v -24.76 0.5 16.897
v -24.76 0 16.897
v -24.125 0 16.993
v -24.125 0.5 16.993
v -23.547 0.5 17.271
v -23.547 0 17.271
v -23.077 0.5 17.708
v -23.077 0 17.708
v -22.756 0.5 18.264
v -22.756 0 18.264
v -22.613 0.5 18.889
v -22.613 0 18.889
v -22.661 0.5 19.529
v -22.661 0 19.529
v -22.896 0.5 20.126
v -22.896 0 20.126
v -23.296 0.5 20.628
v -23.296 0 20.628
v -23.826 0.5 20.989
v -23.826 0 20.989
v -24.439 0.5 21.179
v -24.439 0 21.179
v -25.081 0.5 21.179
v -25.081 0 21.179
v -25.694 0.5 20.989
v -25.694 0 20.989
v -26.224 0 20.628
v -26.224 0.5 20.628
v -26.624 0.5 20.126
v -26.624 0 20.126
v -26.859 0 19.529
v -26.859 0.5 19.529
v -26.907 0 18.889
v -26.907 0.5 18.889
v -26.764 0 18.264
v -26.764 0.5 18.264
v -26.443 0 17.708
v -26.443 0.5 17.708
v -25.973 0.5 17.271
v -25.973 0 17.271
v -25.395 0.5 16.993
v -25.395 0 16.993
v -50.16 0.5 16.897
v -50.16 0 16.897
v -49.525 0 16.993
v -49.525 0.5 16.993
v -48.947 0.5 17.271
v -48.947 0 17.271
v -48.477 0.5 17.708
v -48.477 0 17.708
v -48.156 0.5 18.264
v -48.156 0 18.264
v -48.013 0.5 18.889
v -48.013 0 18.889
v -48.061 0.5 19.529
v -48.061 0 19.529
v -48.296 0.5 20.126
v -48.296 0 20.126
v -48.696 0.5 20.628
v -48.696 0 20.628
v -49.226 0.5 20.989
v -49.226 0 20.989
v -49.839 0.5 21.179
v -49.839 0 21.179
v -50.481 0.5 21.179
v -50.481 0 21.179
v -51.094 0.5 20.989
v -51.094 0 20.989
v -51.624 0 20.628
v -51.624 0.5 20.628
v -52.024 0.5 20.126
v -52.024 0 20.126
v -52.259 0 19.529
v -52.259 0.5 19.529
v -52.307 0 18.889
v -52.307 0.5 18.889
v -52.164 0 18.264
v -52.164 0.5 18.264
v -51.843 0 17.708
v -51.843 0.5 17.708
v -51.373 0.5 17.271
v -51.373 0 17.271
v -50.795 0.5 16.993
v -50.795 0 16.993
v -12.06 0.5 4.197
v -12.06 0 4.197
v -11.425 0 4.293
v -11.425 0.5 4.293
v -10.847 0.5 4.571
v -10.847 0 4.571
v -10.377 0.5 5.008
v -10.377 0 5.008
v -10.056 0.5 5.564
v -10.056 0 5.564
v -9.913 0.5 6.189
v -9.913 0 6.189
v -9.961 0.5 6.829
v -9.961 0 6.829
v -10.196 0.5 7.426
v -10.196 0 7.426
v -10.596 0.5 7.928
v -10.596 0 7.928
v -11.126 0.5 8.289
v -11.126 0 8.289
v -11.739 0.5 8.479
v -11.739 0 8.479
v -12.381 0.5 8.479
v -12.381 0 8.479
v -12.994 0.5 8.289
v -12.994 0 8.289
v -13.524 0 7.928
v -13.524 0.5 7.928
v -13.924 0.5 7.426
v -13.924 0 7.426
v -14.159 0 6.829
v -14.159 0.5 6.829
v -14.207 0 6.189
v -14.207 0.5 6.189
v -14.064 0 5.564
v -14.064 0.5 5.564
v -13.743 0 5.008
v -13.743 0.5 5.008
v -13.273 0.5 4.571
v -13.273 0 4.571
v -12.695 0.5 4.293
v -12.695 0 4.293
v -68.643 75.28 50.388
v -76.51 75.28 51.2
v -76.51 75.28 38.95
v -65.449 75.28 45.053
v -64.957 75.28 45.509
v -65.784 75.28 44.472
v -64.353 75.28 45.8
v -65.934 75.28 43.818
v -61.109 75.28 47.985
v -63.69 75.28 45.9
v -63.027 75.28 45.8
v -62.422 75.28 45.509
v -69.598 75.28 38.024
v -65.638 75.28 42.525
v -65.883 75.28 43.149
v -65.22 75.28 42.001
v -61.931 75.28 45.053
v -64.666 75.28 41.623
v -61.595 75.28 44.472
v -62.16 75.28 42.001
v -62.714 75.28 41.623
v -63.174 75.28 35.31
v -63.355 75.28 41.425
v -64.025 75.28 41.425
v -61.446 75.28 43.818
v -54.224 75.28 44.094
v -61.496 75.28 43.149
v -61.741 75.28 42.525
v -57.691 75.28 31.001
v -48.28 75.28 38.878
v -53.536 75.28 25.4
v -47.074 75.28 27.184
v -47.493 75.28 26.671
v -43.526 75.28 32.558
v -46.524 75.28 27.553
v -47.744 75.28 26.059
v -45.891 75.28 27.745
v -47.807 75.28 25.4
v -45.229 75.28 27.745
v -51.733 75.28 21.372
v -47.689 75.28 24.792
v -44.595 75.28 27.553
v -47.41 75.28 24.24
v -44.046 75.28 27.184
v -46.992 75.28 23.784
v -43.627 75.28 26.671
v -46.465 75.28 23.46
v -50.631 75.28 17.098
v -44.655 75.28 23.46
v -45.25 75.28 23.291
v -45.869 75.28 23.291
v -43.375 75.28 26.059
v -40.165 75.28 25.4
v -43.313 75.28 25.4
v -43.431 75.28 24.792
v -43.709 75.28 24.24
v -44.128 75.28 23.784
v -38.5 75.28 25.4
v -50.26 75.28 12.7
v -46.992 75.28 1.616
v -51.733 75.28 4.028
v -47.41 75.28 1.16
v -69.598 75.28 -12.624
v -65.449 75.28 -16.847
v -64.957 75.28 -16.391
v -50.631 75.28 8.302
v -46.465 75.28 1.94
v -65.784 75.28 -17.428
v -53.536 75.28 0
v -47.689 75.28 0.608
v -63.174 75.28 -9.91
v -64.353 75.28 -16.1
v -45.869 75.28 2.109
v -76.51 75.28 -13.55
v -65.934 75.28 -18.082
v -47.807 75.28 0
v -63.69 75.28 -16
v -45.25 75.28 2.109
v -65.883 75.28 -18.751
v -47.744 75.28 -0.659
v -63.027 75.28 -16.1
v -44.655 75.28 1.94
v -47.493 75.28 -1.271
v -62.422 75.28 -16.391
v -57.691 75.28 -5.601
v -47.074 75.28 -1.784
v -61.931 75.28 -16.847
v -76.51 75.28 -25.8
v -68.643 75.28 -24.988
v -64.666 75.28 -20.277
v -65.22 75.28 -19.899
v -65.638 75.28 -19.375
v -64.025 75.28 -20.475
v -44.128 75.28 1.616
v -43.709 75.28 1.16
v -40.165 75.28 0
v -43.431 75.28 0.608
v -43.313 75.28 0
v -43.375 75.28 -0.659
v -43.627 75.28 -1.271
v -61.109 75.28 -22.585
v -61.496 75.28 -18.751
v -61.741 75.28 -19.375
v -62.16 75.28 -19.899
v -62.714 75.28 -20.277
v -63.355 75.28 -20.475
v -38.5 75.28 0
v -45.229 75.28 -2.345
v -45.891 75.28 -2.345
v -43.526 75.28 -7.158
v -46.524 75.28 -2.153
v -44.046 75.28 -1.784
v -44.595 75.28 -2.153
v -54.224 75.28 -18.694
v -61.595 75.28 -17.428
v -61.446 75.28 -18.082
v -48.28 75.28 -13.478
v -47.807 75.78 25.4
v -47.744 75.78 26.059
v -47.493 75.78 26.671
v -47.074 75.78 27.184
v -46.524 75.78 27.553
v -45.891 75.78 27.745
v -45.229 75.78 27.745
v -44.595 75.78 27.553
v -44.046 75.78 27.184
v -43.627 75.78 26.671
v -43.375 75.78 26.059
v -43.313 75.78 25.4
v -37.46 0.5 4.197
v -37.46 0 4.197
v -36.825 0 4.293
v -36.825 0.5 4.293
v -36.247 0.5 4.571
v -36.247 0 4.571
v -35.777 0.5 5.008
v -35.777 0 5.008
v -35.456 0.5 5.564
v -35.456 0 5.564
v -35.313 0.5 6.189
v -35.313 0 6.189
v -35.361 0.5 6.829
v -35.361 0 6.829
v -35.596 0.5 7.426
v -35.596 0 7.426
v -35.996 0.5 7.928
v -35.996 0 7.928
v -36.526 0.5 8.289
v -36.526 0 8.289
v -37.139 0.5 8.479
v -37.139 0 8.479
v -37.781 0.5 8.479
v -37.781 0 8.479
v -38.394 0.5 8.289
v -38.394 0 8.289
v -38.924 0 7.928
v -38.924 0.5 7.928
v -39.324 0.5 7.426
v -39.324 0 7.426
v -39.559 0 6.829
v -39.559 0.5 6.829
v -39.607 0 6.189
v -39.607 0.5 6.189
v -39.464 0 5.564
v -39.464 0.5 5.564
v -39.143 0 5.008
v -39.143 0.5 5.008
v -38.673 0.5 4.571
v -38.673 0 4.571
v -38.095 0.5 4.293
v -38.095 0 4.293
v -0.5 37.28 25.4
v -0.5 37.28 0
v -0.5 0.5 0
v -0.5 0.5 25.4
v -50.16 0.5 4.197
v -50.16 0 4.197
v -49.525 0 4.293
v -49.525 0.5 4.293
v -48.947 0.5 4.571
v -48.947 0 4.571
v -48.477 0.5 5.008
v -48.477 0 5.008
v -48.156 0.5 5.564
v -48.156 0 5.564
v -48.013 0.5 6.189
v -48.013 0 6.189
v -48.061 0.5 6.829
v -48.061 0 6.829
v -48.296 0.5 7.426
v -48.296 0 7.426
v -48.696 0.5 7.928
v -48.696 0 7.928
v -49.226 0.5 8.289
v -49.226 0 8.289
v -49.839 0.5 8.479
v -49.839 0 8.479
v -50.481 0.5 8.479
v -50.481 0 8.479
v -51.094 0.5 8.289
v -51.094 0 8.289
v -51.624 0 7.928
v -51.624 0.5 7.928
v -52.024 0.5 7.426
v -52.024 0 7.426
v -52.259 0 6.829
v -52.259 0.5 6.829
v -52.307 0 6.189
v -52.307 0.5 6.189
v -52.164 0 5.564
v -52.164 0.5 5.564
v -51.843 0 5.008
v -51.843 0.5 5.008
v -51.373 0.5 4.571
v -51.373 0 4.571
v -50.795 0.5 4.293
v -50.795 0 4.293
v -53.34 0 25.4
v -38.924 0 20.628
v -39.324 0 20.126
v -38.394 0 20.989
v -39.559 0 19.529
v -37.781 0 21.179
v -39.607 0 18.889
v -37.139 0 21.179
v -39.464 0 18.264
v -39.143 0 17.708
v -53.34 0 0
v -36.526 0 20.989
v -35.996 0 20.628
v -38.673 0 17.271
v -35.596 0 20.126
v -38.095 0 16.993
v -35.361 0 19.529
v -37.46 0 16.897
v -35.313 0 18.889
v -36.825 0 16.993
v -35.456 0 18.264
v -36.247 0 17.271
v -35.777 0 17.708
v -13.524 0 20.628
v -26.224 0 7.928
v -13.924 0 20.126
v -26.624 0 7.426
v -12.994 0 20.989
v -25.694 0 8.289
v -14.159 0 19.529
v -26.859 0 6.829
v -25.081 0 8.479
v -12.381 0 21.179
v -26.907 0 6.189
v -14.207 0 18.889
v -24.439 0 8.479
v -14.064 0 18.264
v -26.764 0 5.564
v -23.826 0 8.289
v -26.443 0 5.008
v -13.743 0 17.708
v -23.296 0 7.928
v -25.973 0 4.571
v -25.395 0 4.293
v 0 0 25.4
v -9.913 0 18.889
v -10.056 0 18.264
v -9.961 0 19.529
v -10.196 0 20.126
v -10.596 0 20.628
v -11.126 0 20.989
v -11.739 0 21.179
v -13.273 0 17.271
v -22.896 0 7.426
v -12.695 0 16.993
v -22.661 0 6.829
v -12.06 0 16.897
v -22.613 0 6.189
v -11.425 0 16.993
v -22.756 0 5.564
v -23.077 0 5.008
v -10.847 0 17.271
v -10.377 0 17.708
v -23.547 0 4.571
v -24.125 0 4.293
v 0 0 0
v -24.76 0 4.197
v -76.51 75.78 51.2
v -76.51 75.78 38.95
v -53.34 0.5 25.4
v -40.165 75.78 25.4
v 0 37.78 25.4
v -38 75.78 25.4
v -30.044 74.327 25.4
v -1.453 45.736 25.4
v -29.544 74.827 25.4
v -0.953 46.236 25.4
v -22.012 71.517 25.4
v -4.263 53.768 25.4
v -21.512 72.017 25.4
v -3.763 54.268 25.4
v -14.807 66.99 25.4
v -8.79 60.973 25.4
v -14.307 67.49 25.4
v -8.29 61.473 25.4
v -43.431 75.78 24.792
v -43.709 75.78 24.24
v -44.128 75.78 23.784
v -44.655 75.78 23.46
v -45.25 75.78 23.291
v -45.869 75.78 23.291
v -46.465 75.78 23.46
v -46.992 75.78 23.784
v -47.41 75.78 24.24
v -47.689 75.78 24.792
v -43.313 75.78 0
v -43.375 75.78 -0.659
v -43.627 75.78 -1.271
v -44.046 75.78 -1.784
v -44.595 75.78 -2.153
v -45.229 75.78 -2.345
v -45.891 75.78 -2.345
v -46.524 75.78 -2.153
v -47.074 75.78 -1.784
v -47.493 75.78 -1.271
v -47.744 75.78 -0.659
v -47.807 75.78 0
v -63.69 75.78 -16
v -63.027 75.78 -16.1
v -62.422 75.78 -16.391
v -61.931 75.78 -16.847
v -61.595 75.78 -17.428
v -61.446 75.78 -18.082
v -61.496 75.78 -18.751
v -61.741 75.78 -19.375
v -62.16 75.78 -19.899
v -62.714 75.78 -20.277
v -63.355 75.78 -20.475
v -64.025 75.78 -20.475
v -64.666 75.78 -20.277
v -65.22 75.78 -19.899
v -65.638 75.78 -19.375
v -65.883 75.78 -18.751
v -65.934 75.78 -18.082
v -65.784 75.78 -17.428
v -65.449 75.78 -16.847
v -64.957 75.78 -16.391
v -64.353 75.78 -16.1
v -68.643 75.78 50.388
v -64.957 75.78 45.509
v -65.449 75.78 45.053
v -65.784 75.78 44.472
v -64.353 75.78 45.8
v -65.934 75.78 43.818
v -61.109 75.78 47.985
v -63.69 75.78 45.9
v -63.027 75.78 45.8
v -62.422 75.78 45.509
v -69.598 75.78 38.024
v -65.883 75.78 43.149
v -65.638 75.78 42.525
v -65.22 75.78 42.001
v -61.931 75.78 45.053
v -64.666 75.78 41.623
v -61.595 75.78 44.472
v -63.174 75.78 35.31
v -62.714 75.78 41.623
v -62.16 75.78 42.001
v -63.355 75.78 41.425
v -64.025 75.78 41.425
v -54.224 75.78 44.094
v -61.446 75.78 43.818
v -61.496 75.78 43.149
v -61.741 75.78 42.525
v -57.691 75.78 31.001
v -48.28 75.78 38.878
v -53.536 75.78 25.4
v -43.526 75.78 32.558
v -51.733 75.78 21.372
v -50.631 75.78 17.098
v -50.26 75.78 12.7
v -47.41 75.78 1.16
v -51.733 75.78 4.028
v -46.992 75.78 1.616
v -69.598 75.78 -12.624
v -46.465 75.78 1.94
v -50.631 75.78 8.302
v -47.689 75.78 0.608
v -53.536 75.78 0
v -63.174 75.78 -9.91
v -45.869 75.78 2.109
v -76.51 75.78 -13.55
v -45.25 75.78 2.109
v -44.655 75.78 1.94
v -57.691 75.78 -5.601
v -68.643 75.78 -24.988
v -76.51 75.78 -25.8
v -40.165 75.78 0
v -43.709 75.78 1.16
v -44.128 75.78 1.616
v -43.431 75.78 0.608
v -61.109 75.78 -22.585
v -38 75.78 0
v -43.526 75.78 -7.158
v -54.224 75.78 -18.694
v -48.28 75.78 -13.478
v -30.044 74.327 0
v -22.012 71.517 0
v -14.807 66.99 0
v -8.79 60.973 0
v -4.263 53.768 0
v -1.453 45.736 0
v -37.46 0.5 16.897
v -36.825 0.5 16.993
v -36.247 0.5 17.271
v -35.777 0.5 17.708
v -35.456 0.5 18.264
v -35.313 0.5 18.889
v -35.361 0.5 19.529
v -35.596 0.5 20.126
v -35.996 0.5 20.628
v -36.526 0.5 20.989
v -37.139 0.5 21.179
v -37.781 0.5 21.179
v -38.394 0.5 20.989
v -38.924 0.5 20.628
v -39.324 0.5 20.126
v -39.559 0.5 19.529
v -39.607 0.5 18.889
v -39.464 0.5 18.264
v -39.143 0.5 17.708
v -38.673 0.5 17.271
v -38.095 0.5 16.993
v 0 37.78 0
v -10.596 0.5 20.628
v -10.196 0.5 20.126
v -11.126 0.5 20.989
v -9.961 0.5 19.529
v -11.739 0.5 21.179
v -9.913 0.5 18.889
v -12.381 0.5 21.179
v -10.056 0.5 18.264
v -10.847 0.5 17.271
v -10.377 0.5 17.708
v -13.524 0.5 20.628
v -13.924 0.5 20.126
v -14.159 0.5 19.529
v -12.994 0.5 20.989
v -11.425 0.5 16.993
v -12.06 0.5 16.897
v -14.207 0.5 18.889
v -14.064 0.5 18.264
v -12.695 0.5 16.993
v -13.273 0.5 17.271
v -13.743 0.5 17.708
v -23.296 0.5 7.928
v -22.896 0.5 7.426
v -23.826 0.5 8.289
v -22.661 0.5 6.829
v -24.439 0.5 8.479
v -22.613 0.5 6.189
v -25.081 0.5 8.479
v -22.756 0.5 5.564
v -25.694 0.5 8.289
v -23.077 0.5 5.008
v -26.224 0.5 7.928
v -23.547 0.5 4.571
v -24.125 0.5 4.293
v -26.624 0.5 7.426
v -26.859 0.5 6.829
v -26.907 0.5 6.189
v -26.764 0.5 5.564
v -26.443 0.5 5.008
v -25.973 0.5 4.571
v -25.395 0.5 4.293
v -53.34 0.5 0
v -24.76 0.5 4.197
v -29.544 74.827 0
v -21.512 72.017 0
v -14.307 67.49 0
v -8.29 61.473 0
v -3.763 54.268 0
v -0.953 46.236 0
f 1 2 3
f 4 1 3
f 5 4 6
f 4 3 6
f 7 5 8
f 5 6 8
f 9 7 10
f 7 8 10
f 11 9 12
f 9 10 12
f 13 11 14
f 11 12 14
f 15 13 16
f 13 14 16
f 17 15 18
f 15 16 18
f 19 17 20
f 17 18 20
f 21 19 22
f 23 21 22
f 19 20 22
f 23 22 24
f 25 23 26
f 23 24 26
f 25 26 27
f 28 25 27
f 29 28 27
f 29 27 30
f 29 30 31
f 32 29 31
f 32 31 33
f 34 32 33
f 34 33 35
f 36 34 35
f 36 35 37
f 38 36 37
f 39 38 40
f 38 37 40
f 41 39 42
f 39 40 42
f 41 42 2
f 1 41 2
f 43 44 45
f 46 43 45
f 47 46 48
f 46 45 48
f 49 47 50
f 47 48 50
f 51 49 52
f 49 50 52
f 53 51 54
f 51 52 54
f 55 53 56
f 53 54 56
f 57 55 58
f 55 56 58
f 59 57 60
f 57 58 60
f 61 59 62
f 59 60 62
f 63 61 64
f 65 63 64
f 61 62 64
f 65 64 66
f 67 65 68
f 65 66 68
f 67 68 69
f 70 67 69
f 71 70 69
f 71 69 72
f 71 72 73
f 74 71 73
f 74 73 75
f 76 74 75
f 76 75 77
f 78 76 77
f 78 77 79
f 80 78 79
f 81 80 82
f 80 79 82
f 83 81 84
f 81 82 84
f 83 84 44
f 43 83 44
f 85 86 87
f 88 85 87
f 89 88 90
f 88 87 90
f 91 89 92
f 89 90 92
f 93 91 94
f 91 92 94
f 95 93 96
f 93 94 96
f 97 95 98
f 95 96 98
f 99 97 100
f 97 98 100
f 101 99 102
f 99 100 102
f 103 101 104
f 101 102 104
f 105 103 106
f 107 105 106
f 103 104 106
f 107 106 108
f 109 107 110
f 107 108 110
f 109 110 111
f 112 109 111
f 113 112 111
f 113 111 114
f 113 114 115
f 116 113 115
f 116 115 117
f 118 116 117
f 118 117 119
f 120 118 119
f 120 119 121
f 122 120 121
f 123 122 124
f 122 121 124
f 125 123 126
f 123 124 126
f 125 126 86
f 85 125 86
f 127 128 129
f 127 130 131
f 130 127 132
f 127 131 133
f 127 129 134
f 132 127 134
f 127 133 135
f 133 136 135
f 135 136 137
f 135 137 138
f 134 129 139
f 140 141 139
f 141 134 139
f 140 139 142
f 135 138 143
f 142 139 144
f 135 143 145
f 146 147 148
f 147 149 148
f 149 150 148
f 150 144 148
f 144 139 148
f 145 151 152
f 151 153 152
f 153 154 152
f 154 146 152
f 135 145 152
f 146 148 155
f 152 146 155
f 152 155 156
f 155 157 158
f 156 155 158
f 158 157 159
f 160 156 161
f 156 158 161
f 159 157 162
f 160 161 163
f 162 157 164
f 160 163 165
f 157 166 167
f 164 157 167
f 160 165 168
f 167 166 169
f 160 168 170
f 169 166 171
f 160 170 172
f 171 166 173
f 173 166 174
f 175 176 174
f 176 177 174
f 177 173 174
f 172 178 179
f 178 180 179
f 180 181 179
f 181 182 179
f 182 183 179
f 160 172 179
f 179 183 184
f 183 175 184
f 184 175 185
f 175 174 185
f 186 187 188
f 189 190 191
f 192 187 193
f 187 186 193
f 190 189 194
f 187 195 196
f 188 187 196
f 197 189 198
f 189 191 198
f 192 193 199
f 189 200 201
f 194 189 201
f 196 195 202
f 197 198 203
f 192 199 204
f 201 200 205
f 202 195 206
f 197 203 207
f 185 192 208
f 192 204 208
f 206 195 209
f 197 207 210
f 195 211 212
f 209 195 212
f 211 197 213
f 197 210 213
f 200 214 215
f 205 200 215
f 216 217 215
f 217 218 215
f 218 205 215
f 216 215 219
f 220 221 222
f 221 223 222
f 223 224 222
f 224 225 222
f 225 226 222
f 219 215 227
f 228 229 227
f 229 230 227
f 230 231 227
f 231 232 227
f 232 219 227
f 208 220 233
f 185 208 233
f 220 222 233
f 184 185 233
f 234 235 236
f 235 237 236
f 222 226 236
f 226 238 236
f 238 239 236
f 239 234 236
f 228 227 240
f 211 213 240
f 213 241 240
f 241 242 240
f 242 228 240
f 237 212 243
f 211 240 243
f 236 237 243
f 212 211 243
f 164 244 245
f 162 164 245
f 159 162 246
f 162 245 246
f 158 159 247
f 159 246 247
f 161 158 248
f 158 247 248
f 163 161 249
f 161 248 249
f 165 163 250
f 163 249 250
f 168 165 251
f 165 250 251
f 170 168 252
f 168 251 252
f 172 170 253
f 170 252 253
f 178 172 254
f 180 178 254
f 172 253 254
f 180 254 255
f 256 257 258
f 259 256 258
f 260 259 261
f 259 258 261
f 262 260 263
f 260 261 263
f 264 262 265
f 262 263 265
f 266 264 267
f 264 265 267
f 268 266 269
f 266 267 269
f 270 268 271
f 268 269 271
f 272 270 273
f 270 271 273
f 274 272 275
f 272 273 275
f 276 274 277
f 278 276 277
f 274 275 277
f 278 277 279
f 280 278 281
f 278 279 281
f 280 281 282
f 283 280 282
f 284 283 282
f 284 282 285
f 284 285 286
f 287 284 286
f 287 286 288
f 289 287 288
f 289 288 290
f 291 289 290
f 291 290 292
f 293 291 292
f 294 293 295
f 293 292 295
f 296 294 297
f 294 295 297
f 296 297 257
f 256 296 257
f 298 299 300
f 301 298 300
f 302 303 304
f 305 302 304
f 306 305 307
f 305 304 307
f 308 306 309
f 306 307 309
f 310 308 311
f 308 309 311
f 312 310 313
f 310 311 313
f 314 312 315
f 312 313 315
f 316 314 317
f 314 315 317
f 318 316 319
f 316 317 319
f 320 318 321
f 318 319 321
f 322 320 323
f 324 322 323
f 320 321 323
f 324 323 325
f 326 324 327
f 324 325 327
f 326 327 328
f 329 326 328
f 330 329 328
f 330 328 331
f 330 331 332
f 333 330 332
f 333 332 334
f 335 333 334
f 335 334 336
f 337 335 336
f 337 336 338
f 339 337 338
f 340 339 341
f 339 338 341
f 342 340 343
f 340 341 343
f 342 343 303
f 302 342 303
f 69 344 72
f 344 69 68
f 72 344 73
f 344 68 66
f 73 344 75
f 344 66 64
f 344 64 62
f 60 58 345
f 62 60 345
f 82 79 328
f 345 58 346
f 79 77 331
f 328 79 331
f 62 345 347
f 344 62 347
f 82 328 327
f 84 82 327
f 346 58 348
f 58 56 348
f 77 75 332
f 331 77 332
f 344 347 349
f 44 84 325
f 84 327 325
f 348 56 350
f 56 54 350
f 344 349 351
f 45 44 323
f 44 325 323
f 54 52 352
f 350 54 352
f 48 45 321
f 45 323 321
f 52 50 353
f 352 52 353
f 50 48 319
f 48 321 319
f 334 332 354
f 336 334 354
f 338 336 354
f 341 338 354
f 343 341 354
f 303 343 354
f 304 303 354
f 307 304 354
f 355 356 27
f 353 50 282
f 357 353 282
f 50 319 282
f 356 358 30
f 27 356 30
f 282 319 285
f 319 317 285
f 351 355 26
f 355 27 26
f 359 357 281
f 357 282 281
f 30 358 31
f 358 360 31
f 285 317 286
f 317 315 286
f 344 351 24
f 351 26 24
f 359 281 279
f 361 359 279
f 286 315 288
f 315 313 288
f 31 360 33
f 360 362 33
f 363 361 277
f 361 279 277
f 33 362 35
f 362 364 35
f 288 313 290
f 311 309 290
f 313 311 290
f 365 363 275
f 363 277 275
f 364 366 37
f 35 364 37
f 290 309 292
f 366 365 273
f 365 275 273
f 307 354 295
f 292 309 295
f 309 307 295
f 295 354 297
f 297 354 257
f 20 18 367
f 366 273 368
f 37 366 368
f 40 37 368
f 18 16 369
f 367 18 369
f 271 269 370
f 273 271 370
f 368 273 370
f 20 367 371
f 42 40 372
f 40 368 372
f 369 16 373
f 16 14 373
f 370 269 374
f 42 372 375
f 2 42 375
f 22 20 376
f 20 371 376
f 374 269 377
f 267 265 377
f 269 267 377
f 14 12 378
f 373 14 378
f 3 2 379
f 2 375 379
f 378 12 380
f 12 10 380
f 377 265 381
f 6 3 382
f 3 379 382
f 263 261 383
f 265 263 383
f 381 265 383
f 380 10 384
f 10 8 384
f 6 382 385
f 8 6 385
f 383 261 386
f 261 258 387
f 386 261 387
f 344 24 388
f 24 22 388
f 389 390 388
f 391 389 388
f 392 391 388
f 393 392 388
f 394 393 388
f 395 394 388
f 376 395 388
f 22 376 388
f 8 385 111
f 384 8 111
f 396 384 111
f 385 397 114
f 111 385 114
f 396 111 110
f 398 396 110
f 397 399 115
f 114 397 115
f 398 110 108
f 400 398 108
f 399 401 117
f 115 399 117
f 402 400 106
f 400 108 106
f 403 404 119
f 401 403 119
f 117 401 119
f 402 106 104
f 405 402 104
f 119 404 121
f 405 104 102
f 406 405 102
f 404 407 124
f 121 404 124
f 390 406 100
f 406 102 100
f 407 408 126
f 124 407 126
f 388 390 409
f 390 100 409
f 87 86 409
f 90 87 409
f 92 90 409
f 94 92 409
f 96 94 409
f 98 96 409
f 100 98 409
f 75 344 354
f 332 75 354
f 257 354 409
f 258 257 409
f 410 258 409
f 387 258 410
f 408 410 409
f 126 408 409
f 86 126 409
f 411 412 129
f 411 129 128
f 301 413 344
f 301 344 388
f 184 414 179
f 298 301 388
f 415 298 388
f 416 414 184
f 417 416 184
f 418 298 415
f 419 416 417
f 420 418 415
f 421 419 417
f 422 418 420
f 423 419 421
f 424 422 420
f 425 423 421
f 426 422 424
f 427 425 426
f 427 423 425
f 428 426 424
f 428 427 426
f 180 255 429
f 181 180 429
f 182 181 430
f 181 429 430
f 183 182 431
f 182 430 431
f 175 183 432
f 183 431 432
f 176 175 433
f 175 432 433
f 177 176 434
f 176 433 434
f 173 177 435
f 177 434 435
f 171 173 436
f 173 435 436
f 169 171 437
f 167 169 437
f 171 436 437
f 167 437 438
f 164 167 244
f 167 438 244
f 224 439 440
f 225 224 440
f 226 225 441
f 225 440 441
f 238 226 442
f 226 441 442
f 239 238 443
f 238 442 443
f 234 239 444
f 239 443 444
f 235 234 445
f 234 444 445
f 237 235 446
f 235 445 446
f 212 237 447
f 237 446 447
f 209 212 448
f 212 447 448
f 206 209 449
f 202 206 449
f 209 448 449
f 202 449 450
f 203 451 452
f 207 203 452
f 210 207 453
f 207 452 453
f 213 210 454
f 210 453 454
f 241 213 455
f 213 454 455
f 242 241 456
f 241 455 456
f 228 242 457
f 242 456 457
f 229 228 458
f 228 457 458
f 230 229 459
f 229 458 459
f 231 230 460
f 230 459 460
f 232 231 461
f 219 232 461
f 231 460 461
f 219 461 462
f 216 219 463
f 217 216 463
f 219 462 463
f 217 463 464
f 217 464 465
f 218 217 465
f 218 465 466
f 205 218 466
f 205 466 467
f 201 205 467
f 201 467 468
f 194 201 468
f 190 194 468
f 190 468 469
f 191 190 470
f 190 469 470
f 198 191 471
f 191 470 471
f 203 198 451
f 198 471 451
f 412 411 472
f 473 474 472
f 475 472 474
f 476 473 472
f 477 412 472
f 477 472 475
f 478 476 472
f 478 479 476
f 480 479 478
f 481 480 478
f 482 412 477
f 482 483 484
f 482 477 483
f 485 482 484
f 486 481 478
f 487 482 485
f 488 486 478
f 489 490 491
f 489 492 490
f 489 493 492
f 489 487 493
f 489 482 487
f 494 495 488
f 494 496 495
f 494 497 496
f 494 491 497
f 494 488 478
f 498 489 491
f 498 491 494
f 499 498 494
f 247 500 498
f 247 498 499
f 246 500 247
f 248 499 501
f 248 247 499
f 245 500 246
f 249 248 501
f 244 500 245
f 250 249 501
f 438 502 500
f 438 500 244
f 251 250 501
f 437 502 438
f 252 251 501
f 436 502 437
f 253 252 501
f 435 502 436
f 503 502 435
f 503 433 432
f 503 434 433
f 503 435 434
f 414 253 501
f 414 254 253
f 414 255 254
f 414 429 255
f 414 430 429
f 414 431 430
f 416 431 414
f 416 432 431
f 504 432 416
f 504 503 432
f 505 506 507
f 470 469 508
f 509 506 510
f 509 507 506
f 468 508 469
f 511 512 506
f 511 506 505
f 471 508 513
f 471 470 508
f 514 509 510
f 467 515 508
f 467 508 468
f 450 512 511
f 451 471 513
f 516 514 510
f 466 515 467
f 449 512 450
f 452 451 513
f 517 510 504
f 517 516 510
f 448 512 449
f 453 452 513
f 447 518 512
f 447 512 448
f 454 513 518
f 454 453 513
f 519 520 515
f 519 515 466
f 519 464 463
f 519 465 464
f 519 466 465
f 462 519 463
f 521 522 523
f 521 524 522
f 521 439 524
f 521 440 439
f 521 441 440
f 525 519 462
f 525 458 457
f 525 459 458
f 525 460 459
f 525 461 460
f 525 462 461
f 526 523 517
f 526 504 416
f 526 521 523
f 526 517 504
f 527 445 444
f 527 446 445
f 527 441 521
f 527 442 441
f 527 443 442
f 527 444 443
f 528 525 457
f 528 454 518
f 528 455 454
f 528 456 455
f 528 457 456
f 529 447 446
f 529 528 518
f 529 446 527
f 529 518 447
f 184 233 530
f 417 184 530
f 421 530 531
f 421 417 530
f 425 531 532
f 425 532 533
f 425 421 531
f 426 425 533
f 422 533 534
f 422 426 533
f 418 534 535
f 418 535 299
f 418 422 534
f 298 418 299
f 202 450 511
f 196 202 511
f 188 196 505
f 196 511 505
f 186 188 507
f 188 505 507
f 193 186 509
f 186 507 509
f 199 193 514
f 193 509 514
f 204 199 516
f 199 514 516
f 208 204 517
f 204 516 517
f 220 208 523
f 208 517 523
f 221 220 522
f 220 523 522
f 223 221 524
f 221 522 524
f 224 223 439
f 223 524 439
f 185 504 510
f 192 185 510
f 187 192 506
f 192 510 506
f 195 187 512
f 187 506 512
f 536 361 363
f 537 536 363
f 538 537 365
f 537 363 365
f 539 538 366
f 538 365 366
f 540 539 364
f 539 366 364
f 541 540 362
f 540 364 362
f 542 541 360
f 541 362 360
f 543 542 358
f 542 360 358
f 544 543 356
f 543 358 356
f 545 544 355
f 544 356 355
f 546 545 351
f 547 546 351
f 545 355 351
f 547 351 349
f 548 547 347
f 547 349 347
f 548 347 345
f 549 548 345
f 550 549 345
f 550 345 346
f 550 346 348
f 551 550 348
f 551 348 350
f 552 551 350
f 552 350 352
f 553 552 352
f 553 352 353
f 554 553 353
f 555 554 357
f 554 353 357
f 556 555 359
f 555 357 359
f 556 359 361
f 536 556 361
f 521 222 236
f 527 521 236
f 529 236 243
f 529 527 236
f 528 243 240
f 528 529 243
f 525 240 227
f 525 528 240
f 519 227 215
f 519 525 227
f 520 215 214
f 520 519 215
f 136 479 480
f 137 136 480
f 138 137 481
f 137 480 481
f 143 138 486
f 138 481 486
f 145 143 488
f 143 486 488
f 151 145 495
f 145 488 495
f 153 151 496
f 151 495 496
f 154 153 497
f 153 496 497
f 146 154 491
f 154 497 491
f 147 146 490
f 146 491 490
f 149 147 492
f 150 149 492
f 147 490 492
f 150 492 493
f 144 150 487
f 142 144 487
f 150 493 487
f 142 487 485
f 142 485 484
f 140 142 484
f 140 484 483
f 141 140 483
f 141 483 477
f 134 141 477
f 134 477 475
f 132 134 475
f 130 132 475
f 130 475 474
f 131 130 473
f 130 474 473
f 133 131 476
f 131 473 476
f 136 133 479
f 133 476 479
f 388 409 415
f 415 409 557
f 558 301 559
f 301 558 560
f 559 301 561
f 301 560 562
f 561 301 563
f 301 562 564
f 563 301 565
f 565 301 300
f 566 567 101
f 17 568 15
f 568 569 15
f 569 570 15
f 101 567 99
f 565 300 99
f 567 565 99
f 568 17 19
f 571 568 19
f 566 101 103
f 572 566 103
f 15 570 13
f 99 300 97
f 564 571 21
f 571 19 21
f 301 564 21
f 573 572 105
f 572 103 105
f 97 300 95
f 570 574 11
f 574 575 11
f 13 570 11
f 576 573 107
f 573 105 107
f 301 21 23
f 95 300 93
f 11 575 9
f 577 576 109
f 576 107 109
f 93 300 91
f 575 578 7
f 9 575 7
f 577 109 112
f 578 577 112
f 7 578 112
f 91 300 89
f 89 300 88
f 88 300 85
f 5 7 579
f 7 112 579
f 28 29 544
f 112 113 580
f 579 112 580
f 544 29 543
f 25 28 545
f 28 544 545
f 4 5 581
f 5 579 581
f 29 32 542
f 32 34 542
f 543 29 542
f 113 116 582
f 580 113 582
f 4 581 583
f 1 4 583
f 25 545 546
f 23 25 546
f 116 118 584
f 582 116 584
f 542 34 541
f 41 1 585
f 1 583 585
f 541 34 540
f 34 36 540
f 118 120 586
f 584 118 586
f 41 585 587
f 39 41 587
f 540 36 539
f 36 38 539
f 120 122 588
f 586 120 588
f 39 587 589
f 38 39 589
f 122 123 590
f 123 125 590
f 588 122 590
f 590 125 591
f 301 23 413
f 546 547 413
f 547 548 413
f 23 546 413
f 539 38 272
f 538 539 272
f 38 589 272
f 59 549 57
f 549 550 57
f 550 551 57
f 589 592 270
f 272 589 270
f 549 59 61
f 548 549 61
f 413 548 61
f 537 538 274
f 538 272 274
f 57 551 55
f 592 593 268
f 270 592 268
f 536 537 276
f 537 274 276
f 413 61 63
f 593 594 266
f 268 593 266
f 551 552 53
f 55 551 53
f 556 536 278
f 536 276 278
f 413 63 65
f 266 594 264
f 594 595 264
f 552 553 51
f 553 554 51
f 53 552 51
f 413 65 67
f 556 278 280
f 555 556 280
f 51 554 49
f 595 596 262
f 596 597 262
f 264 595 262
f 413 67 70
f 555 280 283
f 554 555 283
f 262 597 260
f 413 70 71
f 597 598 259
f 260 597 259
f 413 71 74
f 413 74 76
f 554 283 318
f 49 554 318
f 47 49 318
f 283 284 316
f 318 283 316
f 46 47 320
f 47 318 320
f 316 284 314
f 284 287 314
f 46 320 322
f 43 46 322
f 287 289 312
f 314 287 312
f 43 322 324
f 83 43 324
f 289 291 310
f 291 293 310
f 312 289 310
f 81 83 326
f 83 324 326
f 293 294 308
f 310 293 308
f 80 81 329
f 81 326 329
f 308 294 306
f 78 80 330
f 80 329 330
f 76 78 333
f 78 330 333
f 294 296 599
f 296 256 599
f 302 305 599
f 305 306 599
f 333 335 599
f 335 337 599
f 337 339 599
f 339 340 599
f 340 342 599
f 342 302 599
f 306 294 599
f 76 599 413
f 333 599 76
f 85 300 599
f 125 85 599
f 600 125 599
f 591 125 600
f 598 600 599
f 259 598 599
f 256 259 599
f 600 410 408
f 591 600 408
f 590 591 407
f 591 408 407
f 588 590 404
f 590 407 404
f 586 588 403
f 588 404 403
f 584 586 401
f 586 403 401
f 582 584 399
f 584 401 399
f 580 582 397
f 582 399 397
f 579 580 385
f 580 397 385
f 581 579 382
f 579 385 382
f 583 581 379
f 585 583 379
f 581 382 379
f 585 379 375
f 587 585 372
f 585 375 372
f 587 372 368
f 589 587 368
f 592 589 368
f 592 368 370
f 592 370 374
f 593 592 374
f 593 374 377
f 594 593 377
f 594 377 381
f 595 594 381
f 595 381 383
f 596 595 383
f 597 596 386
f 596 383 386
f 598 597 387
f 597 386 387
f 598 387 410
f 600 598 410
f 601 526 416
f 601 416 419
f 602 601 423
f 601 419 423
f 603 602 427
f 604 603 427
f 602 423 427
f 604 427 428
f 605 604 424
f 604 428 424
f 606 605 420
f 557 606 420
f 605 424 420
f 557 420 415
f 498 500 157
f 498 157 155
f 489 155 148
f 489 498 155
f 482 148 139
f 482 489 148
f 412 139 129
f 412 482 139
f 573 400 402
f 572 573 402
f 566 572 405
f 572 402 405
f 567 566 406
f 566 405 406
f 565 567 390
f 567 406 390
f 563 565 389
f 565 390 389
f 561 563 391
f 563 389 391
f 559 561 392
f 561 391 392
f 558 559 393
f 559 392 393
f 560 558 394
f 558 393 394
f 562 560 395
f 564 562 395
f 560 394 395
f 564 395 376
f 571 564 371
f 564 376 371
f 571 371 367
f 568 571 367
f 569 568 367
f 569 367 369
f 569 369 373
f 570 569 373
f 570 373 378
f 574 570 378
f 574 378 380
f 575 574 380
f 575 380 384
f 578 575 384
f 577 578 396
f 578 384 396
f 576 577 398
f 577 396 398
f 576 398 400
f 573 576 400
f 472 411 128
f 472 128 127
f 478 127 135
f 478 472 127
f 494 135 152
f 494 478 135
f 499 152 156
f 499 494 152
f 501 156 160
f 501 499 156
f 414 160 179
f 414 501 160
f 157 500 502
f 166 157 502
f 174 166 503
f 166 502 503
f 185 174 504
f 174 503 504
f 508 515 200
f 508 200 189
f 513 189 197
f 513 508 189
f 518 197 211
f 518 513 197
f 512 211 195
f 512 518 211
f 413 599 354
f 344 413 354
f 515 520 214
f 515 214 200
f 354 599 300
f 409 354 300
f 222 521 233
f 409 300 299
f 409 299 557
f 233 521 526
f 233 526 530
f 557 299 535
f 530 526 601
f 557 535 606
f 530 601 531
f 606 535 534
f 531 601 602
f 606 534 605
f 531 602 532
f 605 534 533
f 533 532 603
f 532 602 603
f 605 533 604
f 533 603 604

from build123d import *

# Parameters (mm, degrees)
BOSS_EXTRUDE1_DEPTH = 25.4
SKETCH3_R           = 2.15265
CUT_EXTRUDE1_DEPTH  = 0.5
SKETCH2_R           = 2.25
BOSS_EXTRUDE2_DEPTH = 0.5
CUT_EXTRUDE2_DEPTH  = 0.5
FILLET2_R           = 38


with BuildPart() as part:
    # Sketch1 → Boss-Extrude1 (new body)
    with BuildSketch(Plane.XY):
        Polygon((-0.5, 0.5), (-53.34, 0.5), (-53.34, 0), (0, 0), (0, 75.78), (-76.50978813, 75.78), (-76.50978813, 75.28), (-0.5, 75.28), align=None)
    extrude(amount=BOSS_EXTRUDE1_DEPTH)

    # Sketch3 → Cut-Extrude1 (cut)
    with BuildSketch(Plane(origin=(0, 0, 0), x_dir=(-1, 0, 0), z_dir=(0, -1, 0))):
        with Locations(Location((50.16, -19.05, 0), (0, 0, 90))):
            Circle(SKETCH3_R)
        with Locations(Location((37.46, -19.05, 0), (0, 0, 90))):
            Circle(SKETCH3_R)
        with Locations(Location((24.76, -19.05, 0), (0, 0, 90))):
            Circle(SKETCH3_R)
        with Locations(Location((12.06, -19.05, 0), (0, 0, 90))):
            Circle(SKETCH3_R)
        with Locations(Location((37.46, -6.35, 0), (0, 0, 90))):
            Circle(SKETCH3_R)
        with Locations(Location((24.76, -6.35, 0), (0, 0, 90))):
            Circle(SKETCH3_R)
        with Locations(Location((12.06, -6.35, 0), (0, 0, 90))):
            Circle(SKETCH3_R)
        with Locations(Location((50.16, -6.35, 0), (0, 0, 90))):
            Circle(SKETCH3_R)
    extrude(amount=-CUT_EXTRUDE1_DEPTH, mode=Mode.SUBTRACT)

    # Sketch2 → Boss-Extrude2 (add)
    with BuildSketch(Plane(origin=(0, 75.78, 0), x_dir=(1, 0, 0), z_dir=(0, 1, 0))):
        with BuildLine():
            ThreePointArc((-38.00978813, -12.7), (-49.286177054, 14.523611076), (-76.50978813, 25.8))
            Line((-76.50978813, 25.8), (-76.50978813, 13.55))
            ThreePointArc((-76.50978813, 13.55), (-57.948235124, 5.861553006), (-50.25978813, -12.7))
            ThreePointArc((-50.25978813, -12.7), (-57.948235124, -31.261553006), (-76.50978813, -38.95))
            Line((-76.50978813, -38.95), (-76.50978813, -51.2))
            ThreePointArc((-76.50978813, -51.2), (-49.286177054, -39.923611076), (-38.00978813, -12.7))
        make_face()
        with Locations(Location((-63.689893146, -43.649964339, 0), (0, 0, 270))):
            Circle(SKETCH2_R, mode=Mode.SUBTRACT)
        with Locations((-45.559823791, -25.519894984)):
            Circle(SKETCH2_R, mode=Mode.SUBTRACT)
        with Locations((-45.559823791, 0.119894984)):
            Circle(SKETCH2_R, mode=Mode.SUBTRACT)
        with Locations(Location((-63.689893146, 18.249964339, 0), (0, 0, 270))):
            Circle(SKETCH2_R, mode=Mode.SUBTRACT)
    extrude(amount=-BOSS_EXTRUDE2_DEPTH)

    # Sketch2<3> → Cut-Extrude2 (cut)
    with BuildSketch(Plane(origin=(0, 75.78, 0), x_dir=(1, 0, 0), z_dir=(0, 1, 0))):
        with BuildLine():
            Line((-43.313020463, -25.4), (-47.806627118, -25.4))
            ThreePointArc((-47.806627118, -25.4), (-45.619792587, -27.769095674), (-43.309823791, -25.519894984))
            ThreePointArc((-43.309823791, -25.519894984), (-43.310623101, -25.459926188), (-43.313020463, -25.4))
        make_face()
        with BuildLine():
            ThreePointArc((-43.313020463, -25.4), (-45.559823791, -23.269894984), (-47.806627118, -25.4))
            Line((-47.806627118, -25.4), (-43.313020463, -25.4))
        make_face()
        with BuildLine():
            Line((-43.313020463, 0), (-47.806627118, 0))
            ThreePointArc((-47.806627118, 0), (-45.559823791, -2.130105016), (-43.313020463, 0))
        make_face()
        with BuildLine():
            ThreePointArc((-43.309823791, 0.119894984), (-45.619792587, 2.369095674), (-47.806627118, 0))
            Line((-47.806627118, 0), (-43.313020463, 0))
            ThreePointArc((-43.313020463, 0), (-43.310623101, 0.059926188), (-43.309823791, 0.119894984))
        make_face()
        with BuildLine():
            Line((-71.249275888, 0), (-76.50978813, -12.7))
            Line((-76.50978813, -12.7), (-76.50978813, -25.4))
            Line((-76.50978813, -25.4), (-53.536488411, -25.4))
            ThreePointArc((-53.536488411, -25.4), (-51.092160215, -19.257948702), (-50.25978813, -12.7))
            ThreePointArc((-50.25978813, -12.7), (-51.092160215, -6.142051298), (-53.536488411, 0))
            Line((-53.536488411, 0), (-71.249275888, 0))
        make_face()
        Polygon((-76.50978813, 0), (-76.50978813, -12.7), (-71.249275888, 0), align=None)
    extrude(amount=-CUT_EXTRUDE2_DEPTH, mode=Mode.SUBTRACT)

    # Fillet2
    fillet2_edges = [part.edges().sort_by_distance(p)[0] for p in [
        (-0.5, 75.28, 12.7),
        (0, 75.78, 12.7),
    ]]
    fillet(fillet2_edges, radius=FILLET2_R)


solid = part.part
